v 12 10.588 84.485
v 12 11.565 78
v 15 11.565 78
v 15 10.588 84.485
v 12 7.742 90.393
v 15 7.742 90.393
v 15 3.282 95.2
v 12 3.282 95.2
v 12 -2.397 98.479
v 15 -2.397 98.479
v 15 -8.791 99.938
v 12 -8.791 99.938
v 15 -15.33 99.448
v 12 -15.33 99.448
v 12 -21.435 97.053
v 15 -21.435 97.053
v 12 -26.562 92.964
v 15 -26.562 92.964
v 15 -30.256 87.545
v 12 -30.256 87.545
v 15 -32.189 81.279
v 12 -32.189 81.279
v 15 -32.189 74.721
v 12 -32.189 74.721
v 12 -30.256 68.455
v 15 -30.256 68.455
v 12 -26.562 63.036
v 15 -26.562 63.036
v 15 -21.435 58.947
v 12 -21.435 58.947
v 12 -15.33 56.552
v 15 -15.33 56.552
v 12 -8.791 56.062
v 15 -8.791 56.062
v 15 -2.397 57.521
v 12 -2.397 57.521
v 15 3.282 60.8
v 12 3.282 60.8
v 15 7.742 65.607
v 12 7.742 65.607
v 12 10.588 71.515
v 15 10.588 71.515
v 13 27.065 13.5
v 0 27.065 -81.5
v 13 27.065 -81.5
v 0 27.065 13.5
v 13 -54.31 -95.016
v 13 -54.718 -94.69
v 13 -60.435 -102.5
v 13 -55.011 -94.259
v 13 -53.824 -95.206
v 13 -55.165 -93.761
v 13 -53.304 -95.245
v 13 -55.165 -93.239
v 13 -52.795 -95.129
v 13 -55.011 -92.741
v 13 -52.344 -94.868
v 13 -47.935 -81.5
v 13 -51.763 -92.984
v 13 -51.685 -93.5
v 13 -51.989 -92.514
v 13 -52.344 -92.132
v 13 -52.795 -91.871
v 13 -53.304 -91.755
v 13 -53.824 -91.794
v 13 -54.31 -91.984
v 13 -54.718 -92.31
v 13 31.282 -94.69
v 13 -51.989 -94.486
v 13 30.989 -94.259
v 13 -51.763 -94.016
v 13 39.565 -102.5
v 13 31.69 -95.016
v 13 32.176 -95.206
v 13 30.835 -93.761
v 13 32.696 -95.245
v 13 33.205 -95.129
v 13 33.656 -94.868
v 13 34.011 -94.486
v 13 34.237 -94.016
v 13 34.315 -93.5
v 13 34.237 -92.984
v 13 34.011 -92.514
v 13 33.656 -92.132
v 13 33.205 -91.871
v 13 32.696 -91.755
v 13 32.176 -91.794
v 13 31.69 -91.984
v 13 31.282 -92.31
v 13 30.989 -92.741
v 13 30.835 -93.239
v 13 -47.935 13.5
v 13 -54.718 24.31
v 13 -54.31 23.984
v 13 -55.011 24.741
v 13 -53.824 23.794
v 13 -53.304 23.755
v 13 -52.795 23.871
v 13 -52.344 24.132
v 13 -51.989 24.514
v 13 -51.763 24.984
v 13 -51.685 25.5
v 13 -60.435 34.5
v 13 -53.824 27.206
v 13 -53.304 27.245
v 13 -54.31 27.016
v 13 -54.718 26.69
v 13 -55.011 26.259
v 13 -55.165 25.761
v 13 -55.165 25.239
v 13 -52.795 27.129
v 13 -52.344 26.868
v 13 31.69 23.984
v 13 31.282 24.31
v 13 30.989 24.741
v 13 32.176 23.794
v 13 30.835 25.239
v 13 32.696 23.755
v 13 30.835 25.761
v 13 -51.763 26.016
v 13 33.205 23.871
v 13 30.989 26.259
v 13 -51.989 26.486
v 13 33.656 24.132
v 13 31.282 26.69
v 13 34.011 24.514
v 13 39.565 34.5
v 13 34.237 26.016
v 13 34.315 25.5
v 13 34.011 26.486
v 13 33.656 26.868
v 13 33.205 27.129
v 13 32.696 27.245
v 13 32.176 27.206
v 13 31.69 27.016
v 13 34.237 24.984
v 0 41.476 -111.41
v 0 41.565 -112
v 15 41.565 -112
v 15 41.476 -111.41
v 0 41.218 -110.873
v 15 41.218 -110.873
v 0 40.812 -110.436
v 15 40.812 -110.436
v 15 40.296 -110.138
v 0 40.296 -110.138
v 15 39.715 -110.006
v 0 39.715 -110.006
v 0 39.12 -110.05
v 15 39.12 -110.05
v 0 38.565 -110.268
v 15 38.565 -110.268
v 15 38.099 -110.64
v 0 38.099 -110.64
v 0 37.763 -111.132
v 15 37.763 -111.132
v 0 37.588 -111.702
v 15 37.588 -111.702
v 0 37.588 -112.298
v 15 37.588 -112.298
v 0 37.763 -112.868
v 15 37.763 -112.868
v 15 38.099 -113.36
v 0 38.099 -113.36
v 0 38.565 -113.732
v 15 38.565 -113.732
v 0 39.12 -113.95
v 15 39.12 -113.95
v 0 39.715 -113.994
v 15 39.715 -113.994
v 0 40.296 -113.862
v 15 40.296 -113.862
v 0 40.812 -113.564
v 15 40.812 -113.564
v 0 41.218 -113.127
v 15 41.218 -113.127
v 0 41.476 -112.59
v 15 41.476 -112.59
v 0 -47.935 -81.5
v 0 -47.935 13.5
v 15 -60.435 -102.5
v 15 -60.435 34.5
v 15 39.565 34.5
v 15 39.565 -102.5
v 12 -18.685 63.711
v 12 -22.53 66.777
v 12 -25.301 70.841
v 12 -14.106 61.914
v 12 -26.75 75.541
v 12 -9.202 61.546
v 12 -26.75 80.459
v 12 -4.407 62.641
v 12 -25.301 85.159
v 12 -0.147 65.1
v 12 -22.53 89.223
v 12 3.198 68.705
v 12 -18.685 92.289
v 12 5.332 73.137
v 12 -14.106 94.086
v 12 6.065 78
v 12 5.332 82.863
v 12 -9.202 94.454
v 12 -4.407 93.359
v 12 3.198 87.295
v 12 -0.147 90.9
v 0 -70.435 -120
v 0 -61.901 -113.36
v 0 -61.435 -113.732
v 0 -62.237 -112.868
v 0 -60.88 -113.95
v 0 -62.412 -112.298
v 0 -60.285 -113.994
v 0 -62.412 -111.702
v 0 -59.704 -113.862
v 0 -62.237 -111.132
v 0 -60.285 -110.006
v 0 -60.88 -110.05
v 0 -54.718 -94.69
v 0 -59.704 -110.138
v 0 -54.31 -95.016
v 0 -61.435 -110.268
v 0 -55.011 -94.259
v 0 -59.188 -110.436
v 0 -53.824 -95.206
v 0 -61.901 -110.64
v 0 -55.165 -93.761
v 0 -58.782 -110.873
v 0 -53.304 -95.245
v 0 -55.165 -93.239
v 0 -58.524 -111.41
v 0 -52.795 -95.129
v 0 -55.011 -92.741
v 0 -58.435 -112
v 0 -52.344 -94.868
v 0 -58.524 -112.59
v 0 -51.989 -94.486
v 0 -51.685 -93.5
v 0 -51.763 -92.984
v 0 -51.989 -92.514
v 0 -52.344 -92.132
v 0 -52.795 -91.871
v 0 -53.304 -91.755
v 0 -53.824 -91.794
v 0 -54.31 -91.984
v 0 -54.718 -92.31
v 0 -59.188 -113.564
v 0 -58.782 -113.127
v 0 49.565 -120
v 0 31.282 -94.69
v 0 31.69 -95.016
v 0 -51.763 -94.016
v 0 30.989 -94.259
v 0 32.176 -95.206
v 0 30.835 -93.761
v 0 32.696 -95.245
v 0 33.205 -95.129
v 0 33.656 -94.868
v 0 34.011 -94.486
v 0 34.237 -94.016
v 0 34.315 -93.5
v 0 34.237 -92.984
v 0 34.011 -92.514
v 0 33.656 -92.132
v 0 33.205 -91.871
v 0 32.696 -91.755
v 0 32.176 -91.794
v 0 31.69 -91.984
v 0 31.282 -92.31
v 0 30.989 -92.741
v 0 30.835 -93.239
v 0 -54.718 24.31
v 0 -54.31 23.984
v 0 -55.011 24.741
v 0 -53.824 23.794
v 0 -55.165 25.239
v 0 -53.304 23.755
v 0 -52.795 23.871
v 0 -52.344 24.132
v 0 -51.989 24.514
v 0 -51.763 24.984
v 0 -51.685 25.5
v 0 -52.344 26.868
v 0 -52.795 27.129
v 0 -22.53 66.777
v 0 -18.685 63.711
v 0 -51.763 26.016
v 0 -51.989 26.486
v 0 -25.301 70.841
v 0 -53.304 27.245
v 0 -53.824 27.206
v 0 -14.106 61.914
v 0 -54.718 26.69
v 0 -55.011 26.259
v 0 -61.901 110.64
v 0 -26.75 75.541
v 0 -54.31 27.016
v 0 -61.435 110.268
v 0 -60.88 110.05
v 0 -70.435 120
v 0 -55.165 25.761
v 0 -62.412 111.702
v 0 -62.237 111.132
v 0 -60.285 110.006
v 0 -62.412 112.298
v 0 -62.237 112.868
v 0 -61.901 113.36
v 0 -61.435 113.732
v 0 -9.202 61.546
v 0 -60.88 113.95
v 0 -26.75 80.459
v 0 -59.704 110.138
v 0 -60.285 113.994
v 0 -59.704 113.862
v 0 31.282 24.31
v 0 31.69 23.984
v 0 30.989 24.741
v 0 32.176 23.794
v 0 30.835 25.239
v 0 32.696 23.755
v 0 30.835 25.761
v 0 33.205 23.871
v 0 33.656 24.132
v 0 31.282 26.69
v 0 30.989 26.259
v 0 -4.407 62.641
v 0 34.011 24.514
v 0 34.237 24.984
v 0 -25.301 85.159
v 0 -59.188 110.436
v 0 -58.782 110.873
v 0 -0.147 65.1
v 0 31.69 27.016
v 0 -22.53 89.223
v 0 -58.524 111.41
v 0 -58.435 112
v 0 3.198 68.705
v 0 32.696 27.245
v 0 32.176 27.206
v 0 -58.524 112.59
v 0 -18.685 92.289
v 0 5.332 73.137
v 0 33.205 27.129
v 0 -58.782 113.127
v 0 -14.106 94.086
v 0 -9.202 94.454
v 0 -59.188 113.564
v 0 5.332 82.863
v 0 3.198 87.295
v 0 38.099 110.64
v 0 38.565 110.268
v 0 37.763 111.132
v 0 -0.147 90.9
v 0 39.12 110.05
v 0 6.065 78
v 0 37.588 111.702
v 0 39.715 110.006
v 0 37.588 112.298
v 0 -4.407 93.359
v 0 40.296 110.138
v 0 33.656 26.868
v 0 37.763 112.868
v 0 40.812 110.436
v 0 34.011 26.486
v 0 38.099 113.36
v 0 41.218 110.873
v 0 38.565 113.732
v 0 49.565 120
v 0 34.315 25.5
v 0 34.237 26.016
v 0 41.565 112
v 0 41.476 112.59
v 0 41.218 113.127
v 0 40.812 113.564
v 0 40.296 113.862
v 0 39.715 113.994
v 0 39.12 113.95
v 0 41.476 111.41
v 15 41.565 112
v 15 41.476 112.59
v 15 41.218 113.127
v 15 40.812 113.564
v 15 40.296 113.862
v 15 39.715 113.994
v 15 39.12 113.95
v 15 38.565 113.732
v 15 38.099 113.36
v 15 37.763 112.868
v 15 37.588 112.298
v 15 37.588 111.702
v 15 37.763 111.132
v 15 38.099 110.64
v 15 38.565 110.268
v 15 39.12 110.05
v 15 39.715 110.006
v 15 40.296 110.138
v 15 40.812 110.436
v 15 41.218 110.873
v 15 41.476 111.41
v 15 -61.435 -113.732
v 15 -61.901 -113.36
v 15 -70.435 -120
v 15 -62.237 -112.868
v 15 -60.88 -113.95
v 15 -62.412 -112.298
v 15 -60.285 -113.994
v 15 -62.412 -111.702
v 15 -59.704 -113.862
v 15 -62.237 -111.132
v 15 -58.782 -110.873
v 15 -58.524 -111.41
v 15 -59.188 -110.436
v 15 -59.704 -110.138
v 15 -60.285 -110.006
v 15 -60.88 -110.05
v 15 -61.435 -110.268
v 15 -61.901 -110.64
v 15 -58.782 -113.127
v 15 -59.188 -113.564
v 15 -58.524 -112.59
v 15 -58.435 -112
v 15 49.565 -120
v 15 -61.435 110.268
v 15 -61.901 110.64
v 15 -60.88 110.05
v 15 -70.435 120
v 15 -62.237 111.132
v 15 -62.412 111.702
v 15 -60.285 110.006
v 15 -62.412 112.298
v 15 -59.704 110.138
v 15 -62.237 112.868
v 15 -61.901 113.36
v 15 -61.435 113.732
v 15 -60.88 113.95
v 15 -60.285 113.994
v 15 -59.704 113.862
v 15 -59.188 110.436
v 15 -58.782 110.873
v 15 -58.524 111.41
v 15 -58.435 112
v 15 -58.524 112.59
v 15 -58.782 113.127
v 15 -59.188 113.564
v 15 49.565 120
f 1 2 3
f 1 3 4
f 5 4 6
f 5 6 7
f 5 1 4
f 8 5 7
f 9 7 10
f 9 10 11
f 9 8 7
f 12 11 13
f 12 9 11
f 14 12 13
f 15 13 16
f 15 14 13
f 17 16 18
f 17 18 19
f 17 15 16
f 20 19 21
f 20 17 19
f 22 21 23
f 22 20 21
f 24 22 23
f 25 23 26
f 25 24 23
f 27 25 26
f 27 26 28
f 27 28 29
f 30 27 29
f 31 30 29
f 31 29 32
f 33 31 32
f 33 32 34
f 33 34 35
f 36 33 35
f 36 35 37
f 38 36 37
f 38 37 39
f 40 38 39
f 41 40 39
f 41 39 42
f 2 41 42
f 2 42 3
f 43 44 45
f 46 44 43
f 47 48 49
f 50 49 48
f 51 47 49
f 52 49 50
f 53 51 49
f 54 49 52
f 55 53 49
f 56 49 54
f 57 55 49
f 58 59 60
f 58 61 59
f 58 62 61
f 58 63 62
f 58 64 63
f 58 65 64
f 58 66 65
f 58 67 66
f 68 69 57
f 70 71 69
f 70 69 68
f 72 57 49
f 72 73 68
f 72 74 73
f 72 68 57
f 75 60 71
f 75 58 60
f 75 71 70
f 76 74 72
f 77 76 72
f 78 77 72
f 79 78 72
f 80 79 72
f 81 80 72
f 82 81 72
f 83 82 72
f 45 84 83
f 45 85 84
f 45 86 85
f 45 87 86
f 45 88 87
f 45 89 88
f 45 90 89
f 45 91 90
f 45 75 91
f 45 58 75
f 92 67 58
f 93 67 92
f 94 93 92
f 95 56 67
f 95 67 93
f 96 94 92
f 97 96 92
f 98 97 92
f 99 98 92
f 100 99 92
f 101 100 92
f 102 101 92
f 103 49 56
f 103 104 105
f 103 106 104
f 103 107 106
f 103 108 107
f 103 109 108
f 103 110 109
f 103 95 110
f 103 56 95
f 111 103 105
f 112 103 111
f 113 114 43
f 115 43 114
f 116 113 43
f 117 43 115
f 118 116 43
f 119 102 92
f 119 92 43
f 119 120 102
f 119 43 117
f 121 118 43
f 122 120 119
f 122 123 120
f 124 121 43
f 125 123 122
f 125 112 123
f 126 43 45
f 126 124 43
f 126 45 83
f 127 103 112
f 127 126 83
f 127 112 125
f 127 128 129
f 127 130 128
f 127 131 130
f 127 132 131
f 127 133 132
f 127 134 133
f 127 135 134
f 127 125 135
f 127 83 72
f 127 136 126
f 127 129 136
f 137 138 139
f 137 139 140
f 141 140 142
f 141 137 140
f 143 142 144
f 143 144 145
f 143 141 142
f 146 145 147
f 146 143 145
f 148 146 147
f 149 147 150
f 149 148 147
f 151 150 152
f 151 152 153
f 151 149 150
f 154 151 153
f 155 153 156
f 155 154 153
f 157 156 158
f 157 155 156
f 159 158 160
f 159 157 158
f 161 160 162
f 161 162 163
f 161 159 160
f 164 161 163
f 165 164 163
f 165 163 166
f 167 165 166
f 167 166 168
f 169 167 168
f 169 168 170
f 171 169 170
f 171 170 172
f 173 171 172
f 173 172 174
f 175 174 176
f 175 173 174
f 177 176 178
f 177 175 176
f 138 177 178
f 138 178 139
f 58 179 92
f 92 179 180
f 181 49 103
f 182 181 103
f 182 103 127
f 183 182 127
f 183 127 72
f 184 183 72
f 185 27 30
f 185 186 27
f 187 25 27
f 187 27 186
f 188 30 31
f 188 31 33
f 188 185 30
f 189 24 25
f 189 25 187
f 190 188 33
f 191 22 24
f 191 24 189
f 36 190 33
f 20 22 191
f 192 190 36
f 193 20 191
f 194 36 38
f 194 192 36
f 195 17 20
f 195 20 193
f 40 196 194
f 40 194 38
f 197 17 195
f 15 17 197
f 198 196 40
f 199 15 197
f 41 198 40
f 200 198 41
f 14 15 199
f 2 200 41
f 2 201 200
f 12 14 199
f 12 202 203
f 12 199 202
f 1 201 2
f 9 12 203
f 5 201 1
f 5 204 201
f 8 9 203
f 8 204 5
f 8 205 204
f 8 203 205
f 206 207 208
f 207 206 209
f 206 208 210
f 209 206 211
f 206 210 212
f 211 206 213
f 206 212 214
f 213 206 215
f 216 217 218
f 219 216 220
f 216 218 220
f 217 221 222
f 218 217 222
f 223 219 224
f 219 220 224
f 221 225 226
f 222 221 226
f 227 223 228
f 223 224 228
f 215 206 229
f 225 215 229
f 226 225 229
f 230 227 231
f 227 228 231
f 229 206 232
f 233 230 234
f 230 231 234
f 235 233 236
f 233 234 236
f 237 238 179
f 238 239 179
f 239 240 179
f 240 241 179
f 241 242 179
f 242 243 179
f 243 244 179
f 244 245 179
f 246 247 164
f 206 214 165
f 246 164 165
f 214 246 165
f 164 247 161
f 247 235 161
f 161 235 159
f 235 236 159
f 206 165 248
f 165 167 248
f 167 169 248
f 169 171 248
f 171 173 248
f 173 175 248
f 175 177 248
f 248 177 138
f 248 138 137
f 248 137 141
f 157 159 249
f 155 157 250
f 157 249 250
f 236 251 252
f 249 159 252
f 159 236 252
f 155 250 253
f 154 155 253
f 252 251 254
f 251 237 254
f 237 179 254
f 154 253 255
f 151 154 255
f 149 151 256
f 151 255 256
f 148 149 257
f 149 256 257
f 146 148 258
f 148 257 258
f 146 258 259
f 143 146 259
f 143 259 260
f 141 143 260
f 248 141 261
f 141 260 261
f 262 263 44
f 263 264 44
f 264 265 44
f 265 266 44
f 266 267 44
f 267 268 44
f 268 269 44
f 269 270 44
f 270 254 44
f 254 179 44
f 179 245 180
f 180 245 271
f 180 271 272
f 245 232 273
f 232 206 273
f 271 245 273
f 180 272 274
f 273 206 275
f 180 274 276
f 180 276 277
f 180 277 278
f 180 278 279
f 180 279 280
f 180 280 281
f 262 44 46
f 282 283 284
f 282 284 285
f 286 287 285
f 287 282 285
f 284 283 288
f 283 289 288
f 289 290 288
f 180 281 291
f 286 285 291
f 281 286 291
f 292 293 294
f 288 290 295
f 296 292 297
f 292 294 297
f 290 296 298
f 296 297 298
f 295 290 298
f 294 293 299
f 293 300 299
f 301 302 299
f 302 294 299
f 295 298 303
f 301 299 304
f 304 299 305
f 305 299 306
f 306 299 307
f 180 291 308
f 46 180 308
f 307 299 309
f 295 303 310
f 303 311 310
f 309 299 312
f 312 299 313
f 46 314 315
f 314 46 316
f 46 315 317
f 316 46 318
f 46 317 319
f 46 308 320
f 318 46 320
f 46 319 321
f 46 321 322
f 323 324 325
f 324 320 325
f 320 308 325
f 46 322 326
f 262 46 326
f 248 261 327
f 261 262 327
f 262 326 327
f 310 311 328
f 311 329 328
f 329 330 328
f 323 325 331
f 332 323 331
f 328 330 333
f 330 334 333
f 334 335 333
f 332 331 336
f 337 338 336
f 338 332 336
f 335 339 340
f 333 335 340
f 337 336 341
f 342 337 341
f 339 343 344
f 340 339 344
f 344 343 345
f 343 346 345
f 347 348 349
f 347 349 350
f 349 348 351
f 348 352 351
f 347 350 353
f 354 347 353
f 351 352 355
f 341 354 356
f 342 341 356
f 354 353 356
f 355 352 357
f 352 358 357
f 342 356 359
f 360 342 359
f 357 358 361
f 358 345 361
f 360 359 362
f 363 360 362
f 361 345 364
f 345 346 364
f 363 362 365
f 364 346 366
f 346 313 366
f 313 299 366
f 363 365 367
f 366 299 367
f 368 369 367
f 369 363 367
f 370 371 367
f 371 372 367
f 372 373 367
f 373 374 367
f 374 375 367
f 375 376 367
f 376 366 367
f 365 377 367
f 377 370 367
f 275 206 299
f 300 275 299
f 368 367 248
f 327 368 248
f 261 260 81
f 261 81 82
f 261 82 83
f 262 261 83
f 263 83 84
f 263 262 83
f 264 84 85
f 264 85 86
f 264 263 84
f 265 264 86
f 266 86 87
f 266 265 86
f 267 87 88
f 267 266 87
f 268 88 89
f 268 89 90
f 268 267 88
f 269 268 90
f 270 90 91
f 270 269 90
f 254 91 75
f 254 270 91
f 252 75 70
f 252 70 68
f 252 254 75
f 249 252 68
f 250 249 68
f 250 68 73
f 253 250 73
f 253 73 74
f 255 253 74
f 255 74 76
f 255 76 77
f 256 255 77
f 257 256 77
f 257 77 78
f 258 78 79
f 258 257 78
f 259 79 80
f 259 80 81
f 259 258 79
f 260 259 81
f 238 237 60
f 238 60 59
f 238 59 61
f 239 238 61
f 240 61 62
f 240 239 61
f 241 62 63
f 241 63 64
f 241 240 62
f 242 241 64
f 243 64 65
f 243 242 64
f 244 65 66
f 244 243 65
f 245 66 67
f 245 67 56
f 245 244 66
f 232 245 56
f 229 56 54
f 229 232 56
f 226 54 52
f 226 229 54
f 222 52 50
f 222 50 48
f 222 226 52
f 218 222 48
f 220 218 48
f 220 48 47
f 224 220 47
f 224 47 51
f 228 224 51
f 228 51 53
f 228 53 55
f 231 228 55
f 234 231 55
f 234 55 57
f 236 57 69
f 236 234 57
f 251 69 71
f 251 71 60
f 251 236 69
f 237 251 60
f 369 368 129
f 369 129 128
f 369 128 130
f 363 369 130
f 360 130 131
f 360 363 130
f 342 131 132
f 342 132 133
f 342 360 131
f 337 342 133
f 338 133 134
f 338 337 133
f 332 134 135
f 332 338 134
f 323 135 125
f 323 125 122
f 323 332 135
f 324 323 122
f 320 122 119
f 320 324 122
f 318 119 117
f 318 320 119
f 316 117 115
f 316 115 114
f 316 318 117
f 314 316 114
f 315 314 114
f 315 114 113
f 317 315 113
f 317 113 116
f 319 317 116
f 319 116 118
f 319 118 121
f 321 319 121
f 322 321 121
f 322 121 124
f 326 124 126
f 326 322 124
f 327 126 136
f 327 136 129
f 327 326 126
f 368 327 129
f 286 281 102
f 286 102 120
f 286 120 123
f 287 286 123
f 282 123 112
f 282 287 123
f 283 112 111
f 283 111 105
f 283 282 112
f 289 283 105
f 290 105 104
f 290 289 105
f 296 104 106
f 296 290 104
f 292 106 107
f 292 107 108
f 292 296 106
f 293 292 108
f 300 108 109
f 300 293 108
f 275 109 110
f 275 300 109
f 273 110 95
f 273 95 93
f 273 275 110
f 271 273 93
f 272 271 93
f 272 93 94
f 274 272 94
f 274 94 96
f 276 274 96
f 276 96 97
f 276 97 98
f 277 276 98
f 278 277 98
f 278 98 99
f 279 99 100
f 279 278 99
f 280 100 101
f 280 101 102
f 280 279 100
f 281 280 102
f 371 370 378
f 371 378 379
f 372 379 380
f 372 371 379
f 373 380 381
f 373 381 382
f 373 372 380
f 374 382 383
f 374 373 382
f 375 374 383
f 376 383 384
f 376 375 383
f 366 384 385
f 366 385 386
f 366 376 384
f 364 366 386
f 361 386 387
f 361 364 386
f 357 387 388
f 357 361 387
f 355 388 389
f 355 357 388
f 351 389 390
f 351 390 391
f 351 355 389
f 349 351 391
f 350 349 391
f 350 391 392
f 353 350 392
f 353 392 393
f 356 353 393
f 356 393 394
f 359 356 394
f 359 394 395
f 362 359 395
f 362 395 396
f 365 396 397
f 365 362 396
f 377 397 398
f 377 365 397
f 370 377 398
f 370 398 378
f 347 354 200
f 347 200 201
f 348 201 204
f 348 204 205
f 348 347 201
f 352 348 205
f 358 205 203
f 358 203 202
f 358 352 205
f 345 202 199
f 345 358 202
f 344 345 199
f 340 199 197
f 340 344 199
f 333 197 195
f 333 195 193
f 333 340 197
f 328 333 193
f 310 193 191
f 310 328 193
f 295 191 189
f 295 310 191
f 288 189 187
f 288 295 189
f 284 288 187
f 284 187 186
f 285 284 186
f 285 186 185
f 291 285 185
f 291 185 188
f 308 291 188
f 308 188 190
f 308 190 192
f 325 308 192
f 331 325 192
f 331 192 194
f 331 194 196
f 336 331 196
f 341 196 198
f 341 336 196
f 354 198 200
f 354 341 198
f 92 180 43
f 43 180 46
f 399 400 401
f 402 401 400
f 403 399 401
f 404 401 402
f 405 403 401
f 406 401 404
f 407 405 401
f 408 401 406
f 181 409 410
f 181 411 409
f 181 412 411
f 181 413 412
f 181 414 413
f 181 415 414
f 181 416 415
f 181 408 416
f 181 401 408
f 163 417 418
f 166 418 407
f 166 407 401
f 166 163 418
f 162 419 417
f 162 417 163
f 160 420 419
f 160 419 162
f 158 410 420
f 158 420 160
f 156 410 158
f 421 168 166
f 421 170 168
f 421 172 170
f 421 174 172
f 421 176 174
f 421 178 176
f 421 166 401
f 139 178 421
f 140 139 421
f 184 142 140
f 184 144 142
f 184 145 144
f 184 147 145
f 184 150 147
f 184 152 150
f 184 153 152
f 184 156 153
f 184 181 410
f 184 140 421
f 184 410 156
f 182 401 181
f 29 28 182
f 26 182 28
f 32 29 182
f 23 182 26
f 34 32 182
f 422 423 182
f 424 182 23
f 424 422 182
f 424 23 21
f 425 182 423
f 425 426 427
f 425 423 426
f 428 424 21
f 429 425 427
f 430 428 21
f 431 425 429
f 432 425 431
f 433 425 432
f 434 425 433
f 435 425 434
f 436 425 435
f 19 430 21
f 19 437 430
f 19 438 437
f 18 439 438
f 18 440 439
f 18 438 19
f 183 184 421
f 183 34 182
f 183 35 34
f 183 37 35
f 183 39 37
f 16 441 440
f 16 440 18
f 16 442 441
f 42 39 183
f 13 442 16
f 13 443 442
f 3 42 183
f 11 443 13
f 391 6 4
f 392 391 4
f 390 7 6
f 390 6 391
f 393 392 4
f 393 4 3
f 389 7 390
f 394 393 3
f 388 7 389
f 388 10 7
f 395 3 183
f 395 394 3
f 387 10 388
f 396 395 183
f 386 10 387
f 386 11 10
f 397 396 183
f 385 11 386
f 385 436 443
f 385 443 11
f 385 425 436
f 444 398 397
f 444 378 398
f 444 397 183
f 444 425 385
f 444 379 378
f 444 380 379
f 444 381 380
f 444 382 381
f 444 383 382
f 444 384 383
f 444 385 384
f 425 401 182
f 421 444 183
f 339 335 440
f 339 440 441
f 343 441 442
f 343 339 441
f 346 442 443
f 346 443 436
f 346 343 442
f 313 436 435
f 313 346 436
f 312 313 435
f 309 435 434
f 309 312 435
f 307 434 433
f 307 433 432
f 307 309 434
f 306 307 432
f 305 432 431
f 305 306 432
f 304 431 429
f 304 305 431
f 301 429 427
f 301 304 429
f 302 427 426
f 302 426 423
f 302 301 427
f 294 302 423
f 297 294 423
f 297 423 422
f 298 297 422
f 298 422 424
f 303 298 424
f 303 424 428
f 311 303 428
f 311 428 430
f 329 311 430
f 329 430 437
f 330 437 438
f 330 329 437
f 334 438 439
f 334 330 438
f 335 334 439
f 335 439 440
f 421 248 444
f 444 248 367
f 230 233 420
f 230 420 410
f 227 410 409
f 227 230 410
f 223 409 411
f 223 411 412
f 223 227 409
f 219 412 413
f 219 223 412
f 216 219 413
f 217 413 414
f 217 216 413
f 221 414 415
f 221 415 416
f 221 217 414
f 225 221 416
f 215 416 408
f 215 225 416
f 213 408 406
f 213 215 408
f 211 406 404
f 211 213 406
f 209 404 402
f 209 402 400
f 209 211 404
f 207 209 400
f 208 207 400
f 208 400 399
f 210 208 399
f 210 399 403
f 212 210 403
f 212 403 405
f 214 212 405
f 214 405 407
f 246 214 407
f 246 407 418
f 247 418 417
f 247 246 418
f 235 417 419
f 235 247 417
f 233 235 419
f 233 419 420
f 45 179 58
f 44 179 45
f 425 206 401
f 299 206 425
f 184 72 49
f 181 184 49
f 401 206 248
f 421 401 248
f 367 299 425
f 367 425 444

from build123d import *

# Parameters (mm, degrees)
F0_W     = 120
F0_H     = 240
F0_R     = 2
F0_R_2   = 22
F1_DEPTH = 15
F0_R_3   = 16.5
F2_DEPTH = 12
F0_R_4   = 1.75
F0_W_2   = 75
F0_H_2   = 95
F3_DEPTH = 13


# Not quite as in the source:
# - a feature names something its author has since deleted; it is built from what else it names


with BuildPart() as f1:
    # F0 (on Right) → F1 (new body)
    with BuildSketch(Plane.YZ):
        with Locations((-10.4347826087, 0)):
            Rectangle(F0_W, F0_H)
        with Locations((-60.4347826087, -112)):
            Circle(F0_R, mode=Mode.SUBTRACT)
        with Locations((39.5652173913, -112)):
            Circle(F0_R, mode=Mode.SUBTRACT)
        Polygon((-60.4347826087, -102.5), (-60.4347826087, 25.4482906163), (-60.4347826087, 34.5), (39.5652173913, 34.5), (39.5652173913, 25.4482906163), (39.5652173913, -102.5), align=None, mode=Mode.SUBTRACT)
        with Locations((-60.4347826087, 112)):
            Circle(F0_R, mode=Mode.SUBTRACT)
        with Locations((-10.4347826087, 78)):
            Circle(F0_R_2, mode=Mode.SUBTRACT)
        with Locations((39.5652173913, 112.0000034571)):
            Circle(F0_R, mode=Mode.SUBTRACT)
    extrude(amount=F1_DEPTH)

    # F0 (on Right) → F2 (join)
    with BuildSketch(Plane.YZ):
        with Locations((-10.4347826087, 78)):
            Circle(F0_R_2)
        with Locations((-10.4347826087, 78)):
            Circle(F0_R_3, mode=Mode.SUBTRACT)
    extrude(amount=F2_DEPTH)

    # F0 (on Right) → F3 (join)
    with BuildSketch(Plane.YZ):
        Polygon((-60.4347826087, 34.5), (-60.4347826087, 25.4482906163), (-60.4347826087, -102.5), (39.5652173913, -102.5), (39.5652173913, 25.4482906163), (39.5652173913, 34.5), align=None)
        with Locations((-53.4347826087, -93.5)):
            Circle(F0_R_4, mode=Mode.SUBTRACT)
        with Locations((32.5652173913, -93.5)):
            Circle(F0_R_4, mode=Mode.SUBTRACT)
        with Locations((-10.4347826087, -34)):
            Rectangle(F0_W_2, F0_H_2, mode=Mode.SUBTRACT)
        with Locations((-53.4347826087, 25.5)):
            Circle(F0_R_4, mode=Mode.SUBTRACT)
        with Locations((32.5652173913, 25.5)):
            Circle(F0_R_4, mode=Mode.SUBTRACT)
    extrude(amount=F3_DEPTH)


solid = f1.part
